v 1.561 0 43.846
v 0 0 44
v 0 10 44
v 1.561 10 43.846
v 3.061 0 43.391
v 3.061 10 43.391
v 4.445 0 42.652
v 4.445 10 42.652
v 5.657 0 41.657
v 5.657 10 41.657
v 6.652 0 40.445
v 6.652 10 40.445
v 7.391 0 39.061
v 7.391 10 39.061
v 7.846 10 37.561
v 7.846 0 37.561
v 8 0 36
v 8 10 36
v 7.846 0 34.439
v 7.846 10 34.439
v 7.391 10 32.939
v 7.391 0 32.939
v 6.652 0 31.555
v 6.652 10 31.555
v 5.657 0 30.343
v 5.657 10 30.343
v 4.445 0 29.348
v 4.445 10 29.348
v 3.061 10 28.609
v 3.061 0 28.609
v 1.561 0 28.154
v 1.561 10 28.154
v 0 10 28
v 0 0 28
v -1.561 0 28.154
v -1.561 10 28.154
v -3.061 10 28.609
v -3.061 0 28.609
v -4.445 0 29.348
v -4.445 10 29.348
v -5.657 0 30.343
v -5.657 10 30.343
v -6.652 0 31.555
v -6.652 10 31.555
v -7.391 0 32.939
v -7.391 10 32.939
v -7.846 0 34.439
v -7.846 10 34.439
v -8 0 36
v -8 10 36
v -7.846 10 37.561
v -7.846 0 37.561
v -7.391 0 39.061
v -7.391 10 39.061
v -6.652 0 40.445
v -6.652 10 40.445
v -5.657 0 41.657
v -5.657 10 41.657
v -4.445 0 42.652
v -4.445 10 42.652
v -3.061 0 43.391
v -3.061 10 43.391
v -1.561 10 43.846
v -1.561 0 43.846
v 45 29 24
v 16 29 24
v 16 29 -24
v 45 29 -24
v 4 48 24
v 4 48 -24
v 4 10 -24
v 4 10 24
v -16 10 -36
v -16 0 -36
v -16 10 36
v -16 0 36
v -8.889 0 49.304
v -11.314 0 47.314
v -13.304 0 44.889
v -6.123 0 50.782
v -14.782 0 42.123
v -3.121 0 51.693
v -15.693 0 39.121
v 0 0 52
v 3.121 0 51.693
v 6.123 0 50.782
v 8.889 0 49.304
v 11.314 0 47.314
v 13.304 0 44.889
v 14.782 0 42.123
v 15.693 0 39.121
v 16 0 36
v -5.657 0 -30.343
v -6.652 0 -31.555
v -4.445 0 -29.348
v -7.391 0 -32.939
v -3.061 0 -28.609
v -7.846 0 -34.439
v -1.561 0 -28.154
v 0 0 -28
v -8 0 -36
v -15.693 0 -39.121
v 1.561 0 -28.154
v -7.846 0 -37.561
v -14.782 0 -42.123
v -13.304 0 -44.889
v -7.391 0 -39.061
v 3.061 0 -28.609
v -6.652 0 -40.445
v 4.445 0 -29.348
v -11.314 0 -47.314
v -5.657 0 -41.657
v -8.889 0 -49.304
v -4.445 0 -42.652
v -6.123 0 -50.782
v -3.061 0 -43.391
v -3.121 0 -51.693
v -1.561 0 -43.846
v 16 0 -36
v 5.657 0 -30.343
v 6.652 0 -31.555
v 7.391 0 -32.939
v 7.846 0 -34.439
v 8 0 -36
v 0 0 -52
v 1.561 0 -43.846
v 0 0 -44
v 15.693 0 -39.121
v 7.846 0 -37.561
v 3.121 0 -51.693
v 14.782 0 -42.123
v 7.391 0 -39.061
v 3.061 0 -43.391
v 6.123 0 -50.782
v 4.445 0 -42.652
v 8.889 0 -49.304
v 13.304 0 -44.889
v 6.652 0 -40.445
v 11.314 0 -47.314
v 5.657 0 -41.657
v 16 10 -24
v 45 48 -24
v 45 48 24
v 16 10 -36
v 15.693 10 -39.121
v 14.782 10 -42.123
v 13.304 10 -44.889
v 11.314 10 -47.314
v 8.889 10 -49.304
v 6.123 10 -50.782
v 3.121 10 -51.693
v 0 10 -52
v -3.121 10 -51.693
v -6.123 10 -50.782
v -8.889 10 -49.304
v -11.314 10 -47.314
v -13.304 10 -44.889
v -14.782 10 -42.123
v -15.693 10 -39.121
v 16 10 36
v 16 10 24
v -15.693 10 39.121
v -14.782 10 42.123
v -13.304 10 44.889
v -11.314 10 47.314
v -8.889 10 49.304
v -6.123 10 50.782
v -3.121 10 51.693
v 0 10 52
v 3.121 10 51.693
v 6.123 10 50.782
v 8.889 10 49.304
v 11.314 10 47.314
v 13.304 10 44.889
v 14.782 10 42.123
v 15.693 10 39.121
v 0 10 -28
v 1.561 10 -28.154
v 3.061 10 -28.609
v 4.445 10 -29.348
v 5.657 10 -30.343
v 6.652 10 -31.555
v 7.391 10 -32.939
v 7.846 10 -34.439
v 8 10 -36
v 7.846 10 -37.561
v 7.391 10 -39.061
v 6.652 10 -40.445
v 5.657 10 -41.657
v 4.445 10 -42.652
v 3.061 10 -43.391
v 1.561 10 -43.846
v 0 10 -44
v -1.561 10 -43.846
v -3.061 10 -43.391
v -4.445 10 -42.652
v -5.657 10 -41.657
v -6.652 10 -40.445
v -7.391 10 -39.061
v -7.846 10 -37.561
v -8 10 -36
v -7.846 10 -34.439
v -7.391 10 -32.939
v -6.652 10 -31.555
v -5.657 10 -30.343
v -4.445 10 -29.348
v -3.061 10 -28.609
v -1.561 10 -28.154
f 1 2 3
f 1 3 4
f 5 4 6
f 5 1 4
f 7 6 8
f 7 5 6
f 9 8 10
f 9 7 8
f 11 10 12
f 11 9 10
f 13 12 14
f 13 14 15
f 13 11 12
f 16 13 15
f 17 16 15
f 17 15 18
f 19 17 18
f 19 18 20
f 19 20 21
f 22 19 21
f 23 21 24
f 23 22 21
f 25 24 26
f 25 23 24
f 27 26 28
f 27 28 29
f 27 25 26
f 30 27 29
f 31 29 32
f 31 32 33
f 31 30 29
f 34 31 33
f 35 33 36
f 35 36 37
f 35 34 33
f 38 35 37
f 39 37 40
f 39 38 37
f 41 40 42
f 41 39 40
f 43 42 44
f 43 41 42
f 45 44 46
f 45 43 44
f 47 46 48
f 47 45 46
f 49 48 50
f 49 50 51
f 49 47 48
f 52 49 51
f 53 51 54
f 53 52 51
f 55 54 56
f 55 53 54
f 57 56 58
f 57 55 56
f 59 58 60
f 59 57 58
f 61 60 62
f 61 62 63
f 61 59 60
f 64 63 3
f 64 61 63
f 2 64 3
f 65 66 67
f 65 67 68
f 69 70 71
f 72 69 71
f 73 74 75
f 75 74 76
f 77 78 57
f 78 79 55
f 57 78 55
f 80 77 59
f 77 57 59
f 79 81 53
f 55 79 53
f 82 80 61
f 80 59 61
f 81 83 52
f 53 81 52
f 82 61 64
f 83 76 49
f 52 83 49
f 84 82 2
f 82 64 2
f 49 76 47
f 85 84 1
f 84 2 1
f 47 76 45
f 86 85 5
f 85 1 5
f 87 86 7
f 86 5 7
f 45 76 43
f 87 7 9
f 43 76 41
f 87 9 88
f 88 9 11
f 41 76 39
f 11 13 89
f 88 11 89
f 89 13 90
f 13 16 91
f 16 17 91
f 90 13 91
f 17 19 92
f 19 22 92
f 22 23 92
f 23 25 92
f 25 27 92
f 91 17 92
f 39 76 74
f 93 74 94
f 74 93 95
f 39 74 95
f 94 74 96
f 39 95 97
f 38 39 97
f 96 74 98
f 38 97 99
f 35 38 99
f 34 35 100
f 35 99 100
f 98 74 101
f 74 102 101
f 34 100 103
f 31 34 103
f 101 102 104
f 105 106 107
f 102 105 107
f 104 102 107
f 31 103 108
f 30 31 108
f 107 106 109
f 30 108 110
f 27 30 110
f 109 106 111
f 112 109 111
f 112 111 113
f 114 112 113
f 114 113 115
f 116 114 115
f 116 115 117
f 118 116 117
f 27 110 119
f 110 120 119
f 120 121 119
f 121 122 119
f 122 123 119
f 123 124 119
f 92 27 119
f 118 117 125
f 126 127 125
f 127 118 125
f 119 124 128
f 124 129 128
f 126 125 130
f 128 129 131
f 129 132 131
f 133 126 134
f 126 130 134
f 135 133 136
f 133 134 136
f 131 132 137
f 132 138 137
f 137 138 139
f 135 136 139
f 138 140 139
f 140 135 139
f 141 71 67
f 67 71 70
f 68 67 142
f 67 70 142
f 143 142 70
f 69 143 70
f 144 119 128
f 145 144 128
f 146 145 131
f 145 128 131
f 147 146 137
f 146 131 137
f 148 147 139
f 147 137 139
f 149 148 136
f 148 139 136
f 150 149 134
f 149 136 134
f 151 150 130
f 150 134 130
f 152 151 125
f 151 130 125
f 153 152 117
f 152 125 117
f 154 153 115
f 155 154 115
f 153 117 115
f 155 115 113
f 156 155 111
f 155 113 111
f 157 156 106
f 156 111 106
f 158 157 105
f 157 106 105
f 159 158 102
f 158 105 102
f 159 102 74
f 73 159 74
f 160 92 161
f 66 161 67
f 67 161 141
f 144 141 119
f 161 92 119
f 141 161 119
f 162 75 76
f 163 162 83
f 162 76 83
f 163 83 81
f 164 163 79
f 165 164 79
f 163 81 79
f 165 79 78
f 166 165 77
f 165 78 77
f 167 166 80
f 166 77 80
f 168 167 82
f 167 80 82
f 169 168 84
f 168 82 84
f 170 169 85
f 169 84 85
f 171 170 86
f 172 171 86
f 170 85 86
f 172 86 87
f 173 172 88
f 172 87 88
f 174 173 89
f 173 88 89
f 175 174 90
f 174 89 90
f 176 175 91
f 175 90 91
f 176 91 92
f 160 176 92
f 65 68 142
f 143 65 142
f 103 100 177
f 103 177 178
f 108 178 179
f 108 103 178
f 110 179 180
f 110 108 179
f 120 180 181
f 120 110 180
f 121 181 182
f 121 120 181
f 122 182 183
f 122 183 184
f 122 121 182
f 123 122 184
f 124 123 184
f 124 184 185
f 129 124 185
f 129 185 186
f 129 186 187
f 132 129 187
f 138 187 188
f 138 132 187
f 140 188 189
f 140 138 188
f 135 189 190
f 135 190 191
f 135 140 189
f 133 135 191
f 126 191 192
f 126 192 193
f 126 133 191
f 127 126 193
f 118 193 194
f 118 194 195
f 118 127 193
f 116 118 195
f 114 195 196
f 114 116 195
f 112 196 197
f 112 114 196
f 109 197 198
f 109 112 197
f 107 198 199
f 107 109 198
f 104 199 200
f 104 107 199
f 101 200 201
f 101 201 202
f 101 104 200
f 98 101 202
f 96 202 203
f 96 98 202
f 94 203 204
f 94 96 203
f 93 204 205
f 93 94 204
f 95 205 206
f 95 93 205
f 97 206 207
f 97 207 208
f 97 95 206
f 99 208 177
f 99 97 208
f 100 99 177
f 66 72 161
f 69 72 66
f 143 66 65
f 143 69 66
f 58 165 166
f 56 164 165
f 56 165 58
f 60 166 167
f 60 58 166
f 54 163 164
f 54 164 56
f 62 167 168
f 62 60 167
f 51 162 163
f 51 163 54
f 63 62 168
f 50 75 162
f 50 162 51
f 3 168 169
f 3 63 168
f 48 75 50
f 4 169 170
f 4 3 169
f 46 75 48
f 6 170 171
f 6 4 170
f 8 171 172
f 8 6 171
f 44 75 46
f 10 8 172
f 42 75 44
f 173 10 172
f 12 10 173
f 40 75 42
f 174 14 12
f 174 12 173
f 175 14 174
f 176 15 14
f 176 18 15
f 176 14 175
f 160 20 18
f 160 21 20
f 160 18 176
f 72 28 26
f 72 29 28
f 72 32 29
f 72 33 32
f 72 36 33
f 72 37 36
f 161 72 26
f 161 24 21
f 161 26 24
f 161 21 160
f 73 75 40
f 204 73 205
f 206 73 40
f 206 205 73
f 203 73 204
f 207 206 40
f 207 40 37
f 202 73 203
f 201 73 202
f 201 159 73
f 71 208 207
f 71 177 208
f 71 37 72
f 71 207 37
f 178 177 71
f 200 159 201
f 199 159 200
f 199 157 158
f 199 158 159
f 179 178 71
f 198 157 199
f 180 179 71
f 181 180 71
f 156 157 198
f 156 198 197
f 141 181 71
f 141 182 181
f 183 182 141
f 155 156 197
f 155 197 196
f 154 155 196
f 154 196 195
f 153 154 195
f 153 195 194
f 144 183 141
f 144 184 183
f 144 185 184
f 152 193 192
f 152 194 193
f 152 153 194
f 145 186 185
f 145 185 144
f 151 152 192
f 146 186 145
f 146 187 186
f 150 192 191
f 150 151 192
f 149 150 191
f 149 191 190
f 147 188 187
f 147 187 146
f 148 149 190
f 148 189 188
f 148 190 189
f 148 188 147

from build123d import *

# Parameters (mm, degrees)
SKETCH2_R                = 8
BOSS_EXTRUDE1_DEPTH      = 10
BOSS_EXTRUDE2_DEPTH      = 24
BOSS_EXTRUDE2_DEPTH_BACK = 24


with BuildPart() as part:
    # Sketch2 → Boss-Extrude1 (new body)
    with BuildSketch(Plane(origin=(0, 0, 0), x_dir=(1, 0, 0), z_dir=(0, 1, 0))):
        with BuildLine():
            ThreePointArc((16, 36), (0, 52), (-16, 36))
            Line((-16, 36), (-16, -36))
            ThreePointArc((-16, -36), (0, -52), (16, -36))
            Line((16, -36), (16, 36))
        make_face()
        with Locations((0, 36)):
            Circle(SKETCH2_R, mode=Mode.SUBTRACT)
        with Locations((0, -36)):
            Circle(SKETCH2_R, mode=Mode.SUBTRACT)
    extrude(amount=BOSS_EXTRUDE1_DEPTH)

    # Sketch3 → Boss-Extrude2 (add, two sides: drawn at the far end of the back side and taken through both)
    with BuildSketch(Plane.XY.offset(-BOSS_EXTRUDE2_DEPTH_BACK)):
        Polygon((16, 10), (16, 29), (45, 29), (45, 48), (4, 48), (4, 10), align=None)
    extrude(amount=BOSS_EXTRUDE2_DEPTH + BOSS_EXTRUDE2_DEPTH_BACK)


solid = part.part
